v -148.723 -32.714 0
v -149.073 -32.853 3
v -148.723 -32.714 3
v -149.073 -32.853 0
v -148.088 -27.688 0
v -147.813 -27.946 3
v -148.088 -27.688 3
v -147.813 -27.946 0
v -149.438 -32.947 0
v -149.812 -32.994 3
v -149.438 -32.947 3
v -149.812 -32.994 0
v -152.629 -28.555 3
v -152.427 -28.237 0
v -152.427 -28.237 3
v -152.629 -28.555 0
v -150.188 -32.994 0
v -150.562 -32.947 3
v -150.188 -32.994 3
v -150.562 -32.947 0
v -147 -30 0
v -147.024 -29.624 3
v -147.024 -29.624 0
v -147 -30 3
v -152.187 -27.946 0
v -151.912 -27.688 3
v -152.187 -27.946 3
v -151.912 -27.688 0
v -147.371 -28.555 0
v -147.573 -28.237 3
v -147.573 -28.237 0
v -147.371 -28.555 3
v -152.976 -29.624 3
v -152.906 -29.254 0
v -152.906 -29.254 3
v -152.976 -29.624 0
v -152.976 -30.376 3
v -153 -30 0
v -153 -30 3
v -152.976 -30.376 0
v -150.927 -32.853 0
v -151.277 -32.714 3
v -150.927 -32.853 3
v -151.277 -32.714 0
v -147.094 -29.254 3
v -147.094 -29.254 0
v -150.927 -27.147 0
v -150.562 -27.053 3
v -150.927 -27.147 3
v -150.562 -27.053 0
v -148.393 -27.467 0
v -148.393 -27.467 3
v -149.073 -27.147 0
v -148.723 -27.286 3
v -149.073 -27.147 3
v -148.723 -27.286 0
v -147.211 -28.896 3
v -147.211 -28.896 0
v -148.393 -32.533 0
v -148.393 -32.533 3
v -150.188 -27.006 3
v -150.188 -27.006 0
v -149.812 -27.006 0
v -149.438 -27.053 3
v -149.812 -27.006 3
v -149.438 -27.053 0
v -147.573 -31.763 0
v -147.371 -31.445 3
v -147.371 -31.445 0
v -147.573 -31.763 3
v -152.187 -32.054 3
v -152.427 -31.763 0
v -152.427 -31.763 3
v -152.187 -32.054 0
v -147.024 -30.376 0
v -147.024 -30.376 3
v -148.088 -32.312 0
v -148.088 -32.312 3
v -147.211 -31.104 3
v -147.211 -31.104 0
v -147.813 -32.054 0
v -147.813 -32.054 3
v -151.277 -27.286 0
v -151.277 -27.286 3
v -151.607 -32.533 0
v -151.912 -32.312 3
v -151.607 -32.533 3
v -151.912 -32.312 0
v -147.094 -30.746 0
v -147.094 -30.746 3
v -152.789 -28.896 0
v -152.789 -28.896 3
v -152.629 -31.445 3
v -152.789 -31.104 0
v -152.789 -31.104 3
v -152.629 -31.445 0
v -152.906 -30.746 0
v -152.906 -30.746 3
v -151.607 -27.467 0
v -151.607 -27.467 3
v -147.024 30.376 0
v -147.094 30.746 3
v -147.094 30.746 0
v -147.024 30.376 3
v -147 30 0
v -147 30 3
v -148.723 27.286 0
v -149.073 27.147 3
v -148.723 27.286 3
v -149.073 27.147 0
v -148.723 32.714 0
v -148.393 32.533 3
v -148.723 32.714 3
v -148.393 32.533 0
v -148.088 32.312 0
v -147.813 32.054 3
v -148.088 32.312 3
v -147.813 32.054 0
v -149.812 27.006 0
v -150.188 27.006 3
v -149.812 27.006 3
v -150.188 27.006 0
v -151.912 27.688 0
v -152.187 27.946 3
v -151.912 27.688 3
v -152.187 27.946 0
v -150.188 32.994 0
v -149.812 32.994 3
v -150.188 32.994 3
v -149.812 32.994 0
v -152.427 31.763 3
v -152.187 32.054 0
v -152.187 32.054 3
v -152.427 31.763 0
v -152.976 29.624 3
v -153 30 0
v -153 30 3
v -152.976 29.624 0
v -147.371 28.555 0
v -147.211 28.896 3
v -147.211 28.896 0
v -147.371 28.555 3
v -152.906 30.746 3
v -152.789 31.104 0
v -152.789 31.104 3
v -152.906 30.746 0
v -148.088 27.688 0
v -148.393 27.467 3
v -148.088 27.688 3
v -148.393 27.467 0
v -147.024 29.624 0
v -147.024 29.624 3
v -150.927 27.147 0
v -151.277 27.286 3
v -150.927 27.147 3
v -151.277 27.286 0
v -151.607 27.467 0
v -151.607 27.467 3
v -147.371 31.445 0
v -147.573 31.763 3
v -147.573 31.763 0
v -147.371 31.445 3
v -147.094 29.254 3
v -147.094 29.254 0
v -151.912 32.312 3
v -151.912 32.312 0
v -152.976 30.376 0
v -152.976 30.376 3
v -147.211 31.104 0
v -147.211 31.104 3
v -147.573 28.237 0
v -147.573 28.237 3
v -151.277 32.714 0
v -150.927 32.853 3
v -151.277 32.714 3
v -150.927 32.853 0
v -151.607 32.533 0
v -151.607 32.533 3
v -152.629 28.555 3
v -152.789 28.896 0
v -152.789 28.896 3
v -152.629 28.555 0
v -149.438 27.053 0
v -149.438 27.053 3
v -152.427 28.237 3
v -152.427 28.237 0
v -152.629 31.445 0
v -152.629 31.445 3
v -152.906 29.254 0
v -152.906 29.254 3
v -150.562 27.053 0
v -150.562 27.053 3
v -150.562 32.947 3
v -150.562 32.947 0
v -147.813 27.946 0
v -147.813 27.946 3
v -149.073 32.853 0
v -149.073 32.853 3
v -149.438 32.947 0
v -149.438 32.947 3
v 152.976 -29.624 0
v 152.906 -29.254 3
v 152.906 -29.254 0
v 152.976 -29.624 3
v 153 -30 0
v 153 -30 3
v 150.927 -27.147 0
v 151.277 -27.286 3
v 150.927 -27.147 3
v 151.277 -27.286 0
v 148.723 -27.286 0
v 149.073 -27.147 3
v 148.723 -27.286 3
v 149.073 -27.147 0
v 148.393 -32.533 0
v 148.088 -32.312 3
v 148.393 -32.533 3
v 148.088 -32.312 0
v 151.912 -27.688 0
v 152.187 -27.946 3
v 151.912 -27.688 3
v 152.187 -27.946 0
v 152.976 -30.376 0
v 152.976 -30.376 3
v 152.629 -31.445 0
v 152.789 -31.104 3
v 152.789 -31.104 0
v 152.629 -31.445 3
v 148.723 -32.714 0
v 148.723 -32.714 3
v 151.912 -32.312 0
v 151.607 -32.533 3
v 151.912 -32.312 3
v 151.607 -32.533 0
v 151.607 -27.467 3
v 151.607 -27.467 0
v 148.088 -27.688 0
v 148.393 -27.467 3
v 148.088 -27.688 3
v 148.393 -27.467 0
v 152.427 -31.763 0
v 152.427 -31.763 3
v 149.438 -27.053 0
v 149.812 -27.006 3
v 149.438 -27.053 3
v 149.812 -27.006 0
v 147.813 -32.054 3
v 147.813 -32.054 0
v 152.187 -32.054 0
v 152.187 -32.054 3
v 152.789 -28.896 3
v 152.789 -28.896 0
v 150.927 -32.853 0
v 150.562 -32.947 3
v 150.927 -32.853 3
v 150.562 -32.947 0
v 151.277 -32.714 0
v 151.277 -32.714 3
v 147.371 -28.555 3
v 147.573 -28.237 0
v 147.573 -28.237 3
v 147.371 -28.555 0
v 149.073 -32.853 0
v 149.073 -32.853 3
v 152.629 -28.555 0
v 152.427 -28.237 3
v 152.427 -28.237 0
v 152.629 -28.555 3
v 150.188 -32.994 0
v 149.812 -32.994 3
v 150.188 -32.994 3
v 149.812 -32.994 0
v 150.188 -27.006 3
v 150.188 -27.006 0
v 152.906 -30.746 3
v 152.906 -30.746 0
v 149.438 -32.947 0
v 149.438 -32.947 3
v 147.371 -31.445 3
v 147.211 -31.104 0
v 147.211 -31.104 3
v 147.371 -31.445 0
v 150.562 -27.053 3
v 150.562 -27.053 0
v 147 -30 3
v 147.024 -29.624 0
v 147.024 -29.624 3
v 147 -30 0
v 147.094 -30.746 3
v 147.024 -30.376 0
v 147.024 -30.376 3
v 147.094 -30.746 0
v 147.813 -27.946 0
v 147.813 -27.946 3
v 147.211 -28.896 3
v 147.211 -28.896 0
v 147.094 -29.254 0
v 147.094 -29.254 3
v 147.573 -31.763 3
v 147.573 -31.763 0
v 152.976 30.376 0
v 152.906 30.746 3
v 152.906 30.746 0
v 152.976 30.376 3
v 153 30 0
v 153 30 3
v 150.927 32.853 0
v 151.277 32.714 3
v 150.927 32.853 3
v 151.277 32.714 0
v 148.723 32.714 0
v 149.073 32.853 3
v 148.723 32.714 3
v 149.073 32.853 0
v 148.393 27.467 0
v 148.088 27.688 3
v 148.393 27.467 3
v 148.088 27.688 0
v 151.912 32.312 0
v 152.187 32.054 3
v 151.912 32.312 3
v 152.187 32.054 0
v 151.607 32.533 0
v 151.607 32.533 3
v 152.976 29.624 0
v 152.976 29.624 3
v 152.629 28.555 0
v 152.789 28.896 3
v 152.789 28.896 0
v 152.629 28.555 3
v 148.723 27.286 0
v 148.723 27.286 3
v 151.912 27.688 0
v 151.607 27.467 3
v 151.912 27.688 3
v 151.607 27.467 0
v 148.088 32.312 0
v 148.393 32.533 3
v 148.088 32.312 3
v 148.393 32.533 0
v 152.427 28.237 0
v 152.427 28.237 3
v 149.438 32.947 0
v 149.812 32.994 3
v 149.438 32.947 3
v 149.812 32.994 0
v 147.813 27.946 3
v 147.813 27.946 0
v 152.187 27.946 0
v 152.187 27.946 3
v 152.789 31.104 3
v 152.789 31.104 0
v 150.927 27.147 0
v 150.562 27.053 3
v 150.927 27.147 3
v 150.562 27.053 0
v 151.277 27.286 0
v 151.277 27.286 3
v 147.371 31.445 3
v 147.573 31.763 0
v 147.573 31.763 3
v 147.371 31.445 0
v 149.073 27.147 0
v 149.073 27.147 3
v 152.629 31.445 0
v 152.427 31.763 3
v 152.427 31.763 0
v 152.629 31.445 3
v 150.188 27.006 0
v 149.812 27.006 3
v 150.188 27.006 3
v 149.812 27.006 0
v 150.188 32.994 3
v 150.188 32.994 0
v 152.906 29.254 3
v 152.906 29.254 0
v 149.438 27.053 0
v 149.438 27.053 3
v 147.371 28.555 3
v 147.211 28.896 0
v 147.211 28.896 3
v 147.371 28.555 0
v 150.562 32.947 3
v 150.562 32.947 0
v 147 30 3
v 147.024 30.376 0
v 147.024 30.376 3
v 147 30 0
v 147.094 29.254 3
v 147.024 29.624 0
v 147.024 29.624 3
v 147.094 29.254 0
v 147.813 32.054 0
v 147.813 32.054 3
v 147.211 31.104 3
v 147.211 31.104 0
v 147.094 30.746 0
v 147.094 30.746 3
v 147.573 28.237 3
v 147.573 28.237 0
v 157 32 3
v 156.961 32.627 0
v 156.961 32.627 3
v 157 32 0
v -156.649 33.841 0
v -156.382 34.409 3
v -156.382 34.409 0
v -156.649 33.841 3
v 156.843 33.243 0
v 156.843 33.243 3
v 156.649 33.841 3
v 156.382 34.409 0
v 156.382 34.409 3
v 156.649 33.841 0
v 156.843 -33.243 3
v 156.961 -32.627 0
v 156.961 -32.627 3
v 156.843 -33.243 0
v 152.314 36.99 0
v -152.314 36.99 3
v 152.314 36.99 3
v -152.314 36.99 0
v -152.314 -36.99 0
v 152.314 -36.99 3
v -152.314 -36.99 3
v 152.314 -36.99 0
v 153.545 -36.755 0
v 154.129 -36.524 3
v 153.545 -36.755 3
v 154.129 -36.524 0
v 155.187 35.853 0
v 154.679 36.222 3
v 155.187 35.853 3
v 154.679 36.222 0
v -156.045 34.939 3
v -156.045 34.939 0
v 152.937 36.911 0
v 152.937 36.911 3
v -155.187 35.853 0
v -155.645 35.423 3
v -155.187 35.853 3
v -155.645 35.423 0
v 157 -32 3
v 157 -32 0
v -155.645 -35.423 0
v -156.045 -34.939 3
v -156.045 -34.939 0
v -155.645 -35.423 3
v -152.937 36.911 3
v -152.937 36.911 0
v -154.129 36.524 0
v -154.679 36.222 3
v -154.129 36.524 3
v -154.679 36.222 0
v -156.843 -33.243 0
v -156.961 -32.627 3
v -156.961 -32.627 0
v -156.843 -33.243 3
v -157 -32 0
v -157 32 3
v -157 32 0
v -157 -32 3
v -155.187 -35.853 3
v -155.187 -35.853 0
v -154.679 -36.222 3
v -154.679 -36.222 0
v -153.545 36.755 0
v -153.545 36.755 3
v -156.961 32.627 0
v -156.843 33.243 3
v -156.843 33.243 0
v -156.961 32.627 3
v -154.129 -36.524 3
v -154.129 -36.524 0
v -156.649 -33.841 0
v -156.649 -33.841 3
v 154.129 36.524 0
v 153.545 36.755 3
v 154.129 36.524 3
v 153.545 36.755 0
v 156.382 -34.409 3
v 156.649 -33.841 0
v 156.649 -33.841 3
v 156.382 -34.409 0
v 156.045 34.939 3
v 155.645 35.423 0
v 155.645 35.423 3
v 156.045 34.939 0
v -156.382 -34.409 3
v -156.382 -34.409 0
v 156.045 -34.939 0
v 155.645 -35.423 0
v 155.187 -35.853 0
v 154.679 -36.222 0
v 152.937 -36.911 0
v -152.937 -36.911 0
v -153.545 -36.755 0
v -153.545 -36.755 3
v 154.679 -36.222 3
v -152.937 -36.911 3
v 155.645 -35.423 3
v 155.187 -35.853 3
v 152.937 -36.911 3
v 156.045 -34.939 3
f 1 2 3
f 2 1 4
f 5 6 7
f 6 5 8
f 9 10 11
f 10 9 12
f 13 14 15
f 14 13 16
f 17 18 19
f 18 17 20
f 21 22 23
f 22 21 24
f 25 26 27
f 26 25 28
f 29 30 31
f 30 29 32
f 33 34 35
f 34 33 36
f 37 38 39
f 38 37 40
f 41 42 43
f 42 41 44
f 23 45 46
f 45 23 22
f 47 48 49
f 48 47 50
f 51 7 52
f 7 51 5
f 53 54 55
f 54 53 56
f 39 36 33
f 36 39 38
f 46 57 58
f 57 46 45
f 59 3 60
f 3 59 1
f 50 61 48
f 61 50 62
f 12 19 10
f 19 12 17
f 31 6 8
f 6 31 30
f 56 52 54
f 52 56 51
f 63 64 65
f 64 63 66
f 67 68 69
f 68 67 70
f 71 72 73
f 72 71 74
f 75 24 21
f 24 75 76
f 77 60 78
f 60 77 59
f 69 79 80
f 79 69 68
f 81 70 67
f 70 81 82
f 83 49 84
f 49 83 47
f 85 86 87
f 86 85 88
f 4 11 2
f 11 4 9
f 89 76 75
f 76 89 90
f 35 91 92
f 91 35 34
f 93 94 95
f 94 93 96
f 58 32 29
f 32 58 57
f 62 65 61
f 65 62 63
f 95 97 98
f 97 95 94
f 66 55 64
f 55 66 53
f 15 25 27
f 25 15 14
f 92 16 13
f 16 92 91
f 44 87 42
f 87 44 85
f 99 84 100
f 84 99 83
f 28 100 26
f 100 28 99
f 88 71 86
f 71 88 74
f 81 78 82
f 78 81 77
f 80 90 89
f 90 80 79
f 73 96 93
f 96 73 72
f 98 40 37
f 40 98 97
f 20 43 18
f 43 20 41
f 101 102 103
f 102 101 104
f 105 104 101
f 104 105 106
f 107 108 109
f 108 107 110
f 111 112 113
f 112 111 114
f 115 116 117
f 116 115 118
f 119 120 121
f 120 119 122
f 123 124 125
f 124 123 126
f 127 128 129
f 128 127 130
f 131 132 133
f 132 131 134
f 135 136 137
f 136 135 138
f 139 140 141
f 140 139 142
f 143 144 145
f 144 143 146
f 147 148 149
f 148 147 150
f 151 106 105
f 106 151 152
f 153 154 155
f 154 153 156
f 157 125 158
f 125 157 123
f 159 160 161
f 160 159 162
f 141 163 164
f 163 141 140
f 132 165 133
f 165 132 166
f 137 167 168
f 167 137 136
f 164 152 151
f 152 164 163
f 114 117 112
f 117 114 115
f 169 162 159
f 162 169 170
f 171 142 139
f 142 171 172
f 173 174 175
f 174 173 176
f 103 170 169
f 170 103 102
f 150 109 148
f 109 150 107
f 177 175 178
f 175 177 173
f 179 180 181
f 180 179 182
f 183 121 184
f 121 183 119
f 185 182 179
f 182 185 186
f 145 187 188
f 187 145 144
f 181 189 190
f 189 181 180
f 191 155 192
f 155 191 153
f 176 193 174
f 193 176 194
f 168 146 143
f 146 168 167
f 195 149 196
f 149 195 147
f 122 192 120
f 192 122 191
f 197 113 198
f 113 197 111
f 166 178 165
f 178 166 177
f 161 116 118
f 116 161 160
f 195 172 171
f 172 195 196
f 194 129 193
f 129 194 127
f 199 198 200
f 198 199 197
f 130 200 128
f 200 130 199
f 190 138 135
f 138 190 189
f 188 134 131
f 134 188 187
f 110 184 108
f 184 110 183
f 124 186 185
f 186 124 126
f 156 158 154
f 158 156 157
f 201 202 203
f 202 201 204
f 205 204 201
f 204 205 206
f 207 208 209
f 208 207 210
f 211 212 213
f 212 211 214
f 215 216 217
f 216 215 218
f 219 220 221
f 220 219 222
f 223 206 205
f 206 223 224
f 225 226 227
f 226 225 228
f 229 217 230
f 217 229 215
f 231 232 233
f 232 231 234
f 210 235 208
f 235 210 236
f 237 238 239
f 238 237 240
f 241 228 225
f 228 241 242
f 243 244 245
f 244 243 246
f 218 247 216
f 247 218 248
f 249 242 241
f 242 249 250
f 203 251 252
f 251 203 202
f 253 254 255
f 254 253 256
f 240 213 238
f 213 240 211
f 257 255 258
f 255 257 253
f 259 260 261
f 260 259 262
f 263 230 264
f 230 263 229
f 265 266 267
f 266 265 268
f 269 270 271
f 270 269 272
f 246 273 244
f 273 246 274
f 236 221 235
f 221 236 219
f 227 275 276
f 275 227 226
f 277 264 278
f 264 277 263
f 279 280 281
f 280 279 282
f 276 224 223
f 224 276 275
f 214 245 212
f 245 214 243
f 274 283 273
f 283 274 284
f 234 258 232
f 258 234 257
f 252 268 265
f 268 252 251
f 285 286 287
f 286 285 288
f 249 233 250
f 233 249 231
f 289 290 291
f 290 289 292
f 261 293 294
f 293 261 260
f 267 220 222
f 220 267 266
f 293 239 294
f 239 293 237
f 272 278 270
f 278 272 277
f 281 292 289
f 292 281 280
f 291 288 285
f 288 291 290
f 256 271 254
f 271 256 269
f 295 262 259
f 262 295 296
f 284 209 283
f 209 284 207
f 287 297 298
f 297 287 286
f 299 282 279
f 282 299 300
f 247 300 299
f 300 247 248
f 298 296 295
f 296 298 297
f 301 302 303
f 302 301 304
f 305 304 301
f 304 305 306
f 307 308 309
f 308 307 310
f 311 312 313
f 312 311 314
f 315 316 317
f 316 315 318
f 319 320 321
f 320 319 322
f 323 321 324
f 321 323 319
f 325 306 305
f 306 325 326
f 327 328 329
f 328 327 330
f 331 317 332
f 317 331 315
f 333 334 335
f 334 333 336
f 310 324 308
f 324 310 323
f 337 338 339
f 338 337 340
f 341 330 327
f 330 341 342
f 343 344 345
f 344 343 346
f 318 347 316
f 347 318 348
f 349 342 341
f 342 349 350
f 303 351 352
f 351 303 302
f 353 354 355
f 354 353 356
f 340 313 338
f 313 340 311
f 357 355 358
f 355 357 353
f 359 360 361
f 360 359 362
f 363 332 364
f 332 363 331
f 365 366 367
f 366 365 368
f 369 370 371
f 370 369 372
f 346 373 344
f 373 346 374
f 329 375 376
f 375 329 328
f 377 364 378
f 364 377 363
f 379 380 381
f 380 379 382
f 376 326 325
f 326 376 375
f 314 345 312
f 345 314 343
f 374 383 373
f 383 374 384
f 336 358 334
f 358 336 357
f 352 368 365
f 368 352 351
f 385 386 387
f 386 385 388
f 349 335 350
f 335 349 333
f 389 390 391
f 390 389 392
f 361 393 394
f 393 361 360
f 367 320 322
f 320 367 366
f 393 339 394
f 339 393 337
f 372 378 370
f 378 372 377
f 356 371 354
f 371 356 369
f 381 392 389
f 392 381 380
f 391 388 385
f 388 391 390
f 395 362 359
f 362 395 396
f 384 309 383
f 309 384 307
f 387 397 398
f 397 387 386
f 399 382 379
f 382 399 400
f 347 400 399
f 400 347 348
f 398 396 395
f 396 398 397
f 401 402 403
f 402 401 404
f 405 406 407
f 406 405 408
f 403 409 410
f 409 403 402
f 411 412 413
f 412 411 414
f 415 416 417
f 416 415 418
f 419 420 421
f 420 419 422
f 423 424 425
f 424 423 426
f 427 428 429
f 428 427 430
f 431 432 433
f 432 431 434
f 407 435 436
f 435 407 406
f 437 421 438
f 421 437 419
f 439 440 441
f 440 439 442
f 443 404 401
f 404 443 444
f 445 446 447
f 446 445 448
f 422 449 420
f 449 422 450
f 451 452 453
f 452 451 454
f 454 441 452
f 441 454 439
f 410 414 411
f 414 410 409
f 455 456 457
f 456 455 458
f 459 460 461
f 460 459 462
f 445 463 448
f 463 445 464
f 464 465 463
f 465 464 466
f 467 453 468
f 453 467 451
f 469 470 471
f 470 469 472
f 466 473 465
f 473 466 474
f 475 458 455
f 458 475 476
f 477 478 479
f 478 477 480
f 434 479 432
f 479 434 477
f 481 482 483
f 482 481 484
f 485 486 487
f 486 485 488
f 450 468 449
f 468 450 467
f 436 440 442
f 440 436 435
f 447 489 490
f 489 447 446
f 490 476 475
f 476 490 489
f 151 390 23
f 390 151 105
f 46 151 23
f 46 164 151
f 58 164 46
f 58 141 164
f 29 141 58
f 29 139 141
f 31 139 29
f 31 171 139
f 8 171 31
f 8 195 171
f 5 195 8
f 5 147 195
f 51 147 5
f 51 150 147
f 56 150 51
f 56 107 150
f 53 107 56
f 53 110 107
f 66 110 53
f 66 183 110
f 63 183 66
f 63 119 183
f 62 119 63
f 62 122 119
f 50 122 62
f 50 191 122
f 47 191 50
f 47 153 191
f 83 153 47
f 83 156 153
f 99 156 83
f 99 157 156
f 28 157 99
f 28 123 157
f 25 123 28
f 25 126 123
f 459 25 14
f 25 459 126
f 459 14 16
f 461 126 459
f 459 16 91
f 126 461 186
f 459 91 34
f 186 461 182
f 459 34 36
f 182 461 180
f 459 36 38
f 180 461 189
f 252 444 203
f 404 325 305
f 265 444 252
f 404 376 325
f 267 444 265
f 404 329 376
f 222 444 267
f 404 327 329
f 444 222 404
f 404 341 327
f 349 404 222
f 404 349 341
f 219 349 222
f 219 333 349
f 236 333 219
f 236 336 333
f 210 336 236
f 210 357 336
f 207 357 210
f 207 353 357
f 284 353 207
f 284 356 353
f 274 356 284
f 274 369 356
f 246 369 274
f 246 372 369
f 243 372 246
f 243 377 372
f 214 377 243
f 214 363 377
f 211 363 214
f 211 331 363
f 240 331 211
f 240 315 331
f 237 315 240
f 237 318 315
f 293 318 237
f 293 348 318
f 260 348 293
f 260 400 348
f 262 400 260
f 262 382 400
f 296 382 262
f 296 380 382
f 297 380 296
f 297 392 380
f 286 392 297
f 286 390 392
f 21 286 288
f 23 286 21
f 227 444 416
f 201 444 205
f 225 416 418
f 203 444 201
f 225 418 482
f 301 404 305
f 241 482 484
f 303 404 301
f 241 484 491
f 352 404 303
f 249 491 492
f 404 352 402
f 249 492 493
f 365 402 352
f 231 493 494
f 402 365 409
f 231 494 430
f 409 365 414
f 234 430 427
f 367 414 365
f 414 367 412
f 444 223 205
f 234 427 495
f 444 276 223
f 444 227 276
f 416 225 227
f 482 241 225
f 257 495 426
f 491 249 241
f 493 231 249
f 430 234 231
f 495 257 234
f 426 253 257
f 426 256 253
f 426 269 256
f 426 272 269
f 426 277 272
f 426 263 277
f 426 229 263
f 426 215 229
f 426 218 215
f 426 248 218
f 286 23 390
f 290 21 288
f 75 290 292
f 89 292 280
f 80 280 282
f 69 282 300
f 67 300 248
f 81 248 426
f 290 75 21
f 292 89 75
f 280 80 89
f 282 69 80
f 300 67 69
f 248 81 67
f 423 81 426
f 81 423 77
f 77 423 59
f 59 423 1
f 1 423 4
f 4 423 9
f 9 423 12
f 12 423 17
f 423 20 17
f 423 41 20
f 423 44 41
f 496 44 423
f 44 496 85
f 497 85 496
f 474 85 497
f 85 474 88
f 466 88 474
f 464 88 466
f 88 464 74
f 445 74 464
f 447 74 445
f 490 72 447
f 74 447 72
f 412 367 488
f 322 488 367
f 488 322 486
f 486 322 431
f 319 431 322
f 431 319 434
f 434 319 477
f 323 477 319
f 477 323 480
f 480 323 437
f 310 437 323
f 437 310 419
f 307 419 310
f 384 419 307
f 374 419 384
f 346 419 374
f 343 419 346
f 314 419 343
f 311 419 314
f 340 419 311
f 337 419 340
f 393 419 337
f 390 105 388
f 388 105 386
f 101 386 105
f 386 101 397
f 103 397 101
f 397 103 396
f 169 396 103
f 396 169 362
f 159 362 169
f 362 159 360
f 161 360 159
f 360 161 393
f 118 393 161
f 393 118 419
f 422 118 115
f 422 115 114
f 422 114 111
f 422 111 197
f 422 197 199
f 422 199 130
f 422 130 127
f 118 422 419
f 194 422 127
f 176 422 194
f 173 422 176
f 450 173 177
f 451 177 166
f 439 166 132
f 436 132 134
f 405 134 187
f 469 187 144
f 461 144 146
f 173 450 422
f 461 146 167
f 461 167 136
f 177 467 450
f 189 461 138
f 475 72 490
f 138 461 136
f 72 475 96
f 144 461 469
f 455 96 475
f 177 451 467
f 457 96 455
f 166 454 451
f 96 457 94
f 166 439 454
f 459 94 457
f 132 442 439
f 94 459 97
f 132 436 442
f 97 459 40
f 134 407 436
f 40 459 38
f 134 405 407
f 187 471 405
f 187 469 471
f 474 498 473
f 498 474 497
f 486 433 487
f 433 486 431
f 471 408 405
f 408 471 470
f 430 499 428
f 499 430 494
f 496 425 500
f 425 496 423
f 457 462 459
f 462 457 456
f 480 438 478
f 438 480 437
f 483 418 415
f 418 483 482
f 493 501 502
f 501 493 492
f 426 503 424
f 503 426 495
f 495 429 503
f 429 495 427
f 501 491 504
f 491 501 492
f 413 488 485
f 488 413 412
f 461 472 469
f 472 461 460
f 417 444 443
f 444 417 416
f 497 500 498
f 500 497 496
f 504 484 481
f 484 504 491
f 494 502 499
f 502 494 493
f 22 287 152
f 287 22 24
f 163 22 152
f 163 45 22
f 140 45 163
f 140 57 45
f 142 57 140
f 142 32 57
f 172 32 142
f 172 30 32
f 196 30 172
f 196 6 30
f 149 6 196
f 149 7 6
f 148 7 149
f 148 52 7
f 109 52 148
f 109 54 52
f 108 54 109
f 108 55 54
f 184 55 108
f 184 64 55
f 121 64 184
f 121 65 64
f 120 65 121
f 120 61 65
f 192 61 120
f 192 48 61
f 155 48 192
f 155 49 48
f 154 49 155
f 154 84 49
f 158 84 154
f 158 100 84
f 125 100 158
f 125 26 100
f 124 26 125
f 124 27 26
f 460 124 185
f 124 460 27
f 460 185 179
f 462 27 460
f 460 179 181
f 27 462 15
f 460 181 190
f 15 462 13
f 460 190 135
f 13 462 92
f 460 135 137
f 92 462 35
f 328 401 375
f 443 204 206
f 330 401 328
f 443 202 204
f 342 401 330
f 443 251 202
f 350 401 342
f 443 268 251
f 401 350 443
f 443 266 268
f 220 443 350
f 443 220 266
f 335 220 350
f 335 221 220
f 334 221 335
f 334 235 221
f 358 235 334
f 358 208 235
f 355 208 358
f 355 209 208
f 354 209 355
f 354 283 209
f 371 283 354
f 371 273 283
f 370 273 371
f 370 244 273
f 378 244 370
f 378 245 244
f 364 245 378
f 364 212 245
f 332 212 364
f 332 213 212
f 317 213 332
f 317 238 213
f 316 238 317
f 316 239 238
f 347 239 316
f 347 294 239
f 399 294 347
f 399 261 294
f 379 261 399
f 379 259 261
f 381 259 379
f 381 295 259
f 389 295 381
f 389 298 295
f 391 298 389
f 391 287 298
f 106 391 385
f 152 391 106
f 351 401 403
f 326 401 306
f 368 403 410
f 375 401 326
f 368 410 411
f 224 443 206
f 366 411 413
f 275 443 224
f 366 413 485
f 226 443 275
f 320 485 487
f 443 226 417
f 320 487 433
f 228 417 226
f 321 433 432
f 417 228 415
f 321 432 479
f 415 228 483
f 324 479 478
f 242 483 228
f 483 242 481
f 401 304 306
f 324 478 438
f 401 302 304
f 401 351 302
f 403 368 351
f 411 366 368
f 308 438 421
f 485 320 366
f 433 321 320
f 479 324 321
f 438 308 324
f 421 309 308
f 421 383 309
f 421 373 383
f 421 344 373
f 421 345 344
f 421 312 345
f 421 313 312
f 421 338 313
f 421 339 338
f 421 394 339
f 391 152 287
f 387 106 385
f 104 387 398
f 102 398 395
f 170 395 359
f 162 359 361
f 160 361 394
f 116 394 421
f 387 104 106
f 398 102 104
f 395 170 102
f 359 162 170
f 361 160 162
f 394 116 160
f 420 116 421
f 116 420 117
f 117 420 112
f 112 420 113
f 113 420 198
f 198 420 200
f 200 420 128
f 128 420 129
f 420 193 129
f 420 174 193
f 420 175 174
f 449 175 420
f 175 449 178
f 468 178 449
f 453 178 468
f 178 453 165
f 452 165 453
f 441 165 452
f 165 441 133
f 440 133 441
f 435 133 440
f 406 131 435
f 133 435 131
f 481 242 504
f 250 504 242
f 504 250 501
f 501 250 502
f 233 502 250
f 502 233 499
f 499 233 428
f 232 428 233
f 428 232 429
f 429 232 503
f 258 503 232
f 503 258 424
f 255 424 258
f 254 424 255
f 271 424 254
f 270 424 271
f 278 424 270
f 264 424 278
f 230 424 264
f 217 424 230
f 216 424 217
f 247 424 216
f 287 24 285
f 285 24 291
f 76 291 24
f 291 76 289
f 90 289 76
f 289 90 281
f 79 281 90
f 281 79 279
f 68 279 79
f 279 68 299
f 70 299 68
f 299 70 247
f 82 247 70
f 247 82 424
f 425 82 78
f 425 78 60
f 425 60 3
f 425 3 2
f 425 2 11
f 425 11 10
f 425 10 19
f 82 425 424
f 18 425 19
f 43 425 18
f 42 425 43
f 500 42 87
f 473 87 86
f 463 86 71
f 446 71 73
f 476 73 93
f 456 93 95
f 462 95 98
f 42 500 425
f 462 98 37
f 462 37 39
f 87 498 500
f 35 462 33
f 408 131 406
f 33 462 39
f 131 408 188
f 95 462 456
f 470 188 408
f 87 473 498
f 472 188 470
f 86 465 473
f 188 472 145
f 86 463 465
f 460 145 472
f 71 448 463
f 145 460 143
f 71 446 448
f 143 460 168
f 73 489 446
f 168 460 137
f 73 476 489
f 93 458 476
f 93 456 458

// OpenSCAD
$fn = 50;


difference() {
	union() {
		hull() {
			translate(v = [-152.0000000000, 32.0000000000, 0]) {
				cylinder(h = 3, r = 5);
			}
			translate(v = [152.0000000000, 32.0000000000, 0]) {
				cylinder(h = 3, r = 5);
			}
			translate(v = [-152.0000000000, -32.0000000000, 0]) {
				cylinder(h = 3, r = 5);
			}
			translate(v = [152.0000000000, -32.0000000000, 0]) {
				cylinder(h = 3, r = 5);
			}
		}
	}
	union() {
		translate(v = [-150.0000000000, -30.0000000000, -100.0000000000]) {
			cylinder(h = 200, r = 3.0000000000);
		}
		translate(v = [-150.0000000000, 30.0000000000, -100.0000000000]) {
			cylinder(h = 200, r = 3.0000000000);
		}
		translate(v = [150.0000000000, -30.0000000000, -100.0000000000]) {
			cylinder(h = 200, r = 3.0000000000);
		}
		translate(v = [150.0000000000, 30.0000000000, -100.0000000000]) {
			cylinder(h = 200, r = 3.0000000000);
		}
	}
}
